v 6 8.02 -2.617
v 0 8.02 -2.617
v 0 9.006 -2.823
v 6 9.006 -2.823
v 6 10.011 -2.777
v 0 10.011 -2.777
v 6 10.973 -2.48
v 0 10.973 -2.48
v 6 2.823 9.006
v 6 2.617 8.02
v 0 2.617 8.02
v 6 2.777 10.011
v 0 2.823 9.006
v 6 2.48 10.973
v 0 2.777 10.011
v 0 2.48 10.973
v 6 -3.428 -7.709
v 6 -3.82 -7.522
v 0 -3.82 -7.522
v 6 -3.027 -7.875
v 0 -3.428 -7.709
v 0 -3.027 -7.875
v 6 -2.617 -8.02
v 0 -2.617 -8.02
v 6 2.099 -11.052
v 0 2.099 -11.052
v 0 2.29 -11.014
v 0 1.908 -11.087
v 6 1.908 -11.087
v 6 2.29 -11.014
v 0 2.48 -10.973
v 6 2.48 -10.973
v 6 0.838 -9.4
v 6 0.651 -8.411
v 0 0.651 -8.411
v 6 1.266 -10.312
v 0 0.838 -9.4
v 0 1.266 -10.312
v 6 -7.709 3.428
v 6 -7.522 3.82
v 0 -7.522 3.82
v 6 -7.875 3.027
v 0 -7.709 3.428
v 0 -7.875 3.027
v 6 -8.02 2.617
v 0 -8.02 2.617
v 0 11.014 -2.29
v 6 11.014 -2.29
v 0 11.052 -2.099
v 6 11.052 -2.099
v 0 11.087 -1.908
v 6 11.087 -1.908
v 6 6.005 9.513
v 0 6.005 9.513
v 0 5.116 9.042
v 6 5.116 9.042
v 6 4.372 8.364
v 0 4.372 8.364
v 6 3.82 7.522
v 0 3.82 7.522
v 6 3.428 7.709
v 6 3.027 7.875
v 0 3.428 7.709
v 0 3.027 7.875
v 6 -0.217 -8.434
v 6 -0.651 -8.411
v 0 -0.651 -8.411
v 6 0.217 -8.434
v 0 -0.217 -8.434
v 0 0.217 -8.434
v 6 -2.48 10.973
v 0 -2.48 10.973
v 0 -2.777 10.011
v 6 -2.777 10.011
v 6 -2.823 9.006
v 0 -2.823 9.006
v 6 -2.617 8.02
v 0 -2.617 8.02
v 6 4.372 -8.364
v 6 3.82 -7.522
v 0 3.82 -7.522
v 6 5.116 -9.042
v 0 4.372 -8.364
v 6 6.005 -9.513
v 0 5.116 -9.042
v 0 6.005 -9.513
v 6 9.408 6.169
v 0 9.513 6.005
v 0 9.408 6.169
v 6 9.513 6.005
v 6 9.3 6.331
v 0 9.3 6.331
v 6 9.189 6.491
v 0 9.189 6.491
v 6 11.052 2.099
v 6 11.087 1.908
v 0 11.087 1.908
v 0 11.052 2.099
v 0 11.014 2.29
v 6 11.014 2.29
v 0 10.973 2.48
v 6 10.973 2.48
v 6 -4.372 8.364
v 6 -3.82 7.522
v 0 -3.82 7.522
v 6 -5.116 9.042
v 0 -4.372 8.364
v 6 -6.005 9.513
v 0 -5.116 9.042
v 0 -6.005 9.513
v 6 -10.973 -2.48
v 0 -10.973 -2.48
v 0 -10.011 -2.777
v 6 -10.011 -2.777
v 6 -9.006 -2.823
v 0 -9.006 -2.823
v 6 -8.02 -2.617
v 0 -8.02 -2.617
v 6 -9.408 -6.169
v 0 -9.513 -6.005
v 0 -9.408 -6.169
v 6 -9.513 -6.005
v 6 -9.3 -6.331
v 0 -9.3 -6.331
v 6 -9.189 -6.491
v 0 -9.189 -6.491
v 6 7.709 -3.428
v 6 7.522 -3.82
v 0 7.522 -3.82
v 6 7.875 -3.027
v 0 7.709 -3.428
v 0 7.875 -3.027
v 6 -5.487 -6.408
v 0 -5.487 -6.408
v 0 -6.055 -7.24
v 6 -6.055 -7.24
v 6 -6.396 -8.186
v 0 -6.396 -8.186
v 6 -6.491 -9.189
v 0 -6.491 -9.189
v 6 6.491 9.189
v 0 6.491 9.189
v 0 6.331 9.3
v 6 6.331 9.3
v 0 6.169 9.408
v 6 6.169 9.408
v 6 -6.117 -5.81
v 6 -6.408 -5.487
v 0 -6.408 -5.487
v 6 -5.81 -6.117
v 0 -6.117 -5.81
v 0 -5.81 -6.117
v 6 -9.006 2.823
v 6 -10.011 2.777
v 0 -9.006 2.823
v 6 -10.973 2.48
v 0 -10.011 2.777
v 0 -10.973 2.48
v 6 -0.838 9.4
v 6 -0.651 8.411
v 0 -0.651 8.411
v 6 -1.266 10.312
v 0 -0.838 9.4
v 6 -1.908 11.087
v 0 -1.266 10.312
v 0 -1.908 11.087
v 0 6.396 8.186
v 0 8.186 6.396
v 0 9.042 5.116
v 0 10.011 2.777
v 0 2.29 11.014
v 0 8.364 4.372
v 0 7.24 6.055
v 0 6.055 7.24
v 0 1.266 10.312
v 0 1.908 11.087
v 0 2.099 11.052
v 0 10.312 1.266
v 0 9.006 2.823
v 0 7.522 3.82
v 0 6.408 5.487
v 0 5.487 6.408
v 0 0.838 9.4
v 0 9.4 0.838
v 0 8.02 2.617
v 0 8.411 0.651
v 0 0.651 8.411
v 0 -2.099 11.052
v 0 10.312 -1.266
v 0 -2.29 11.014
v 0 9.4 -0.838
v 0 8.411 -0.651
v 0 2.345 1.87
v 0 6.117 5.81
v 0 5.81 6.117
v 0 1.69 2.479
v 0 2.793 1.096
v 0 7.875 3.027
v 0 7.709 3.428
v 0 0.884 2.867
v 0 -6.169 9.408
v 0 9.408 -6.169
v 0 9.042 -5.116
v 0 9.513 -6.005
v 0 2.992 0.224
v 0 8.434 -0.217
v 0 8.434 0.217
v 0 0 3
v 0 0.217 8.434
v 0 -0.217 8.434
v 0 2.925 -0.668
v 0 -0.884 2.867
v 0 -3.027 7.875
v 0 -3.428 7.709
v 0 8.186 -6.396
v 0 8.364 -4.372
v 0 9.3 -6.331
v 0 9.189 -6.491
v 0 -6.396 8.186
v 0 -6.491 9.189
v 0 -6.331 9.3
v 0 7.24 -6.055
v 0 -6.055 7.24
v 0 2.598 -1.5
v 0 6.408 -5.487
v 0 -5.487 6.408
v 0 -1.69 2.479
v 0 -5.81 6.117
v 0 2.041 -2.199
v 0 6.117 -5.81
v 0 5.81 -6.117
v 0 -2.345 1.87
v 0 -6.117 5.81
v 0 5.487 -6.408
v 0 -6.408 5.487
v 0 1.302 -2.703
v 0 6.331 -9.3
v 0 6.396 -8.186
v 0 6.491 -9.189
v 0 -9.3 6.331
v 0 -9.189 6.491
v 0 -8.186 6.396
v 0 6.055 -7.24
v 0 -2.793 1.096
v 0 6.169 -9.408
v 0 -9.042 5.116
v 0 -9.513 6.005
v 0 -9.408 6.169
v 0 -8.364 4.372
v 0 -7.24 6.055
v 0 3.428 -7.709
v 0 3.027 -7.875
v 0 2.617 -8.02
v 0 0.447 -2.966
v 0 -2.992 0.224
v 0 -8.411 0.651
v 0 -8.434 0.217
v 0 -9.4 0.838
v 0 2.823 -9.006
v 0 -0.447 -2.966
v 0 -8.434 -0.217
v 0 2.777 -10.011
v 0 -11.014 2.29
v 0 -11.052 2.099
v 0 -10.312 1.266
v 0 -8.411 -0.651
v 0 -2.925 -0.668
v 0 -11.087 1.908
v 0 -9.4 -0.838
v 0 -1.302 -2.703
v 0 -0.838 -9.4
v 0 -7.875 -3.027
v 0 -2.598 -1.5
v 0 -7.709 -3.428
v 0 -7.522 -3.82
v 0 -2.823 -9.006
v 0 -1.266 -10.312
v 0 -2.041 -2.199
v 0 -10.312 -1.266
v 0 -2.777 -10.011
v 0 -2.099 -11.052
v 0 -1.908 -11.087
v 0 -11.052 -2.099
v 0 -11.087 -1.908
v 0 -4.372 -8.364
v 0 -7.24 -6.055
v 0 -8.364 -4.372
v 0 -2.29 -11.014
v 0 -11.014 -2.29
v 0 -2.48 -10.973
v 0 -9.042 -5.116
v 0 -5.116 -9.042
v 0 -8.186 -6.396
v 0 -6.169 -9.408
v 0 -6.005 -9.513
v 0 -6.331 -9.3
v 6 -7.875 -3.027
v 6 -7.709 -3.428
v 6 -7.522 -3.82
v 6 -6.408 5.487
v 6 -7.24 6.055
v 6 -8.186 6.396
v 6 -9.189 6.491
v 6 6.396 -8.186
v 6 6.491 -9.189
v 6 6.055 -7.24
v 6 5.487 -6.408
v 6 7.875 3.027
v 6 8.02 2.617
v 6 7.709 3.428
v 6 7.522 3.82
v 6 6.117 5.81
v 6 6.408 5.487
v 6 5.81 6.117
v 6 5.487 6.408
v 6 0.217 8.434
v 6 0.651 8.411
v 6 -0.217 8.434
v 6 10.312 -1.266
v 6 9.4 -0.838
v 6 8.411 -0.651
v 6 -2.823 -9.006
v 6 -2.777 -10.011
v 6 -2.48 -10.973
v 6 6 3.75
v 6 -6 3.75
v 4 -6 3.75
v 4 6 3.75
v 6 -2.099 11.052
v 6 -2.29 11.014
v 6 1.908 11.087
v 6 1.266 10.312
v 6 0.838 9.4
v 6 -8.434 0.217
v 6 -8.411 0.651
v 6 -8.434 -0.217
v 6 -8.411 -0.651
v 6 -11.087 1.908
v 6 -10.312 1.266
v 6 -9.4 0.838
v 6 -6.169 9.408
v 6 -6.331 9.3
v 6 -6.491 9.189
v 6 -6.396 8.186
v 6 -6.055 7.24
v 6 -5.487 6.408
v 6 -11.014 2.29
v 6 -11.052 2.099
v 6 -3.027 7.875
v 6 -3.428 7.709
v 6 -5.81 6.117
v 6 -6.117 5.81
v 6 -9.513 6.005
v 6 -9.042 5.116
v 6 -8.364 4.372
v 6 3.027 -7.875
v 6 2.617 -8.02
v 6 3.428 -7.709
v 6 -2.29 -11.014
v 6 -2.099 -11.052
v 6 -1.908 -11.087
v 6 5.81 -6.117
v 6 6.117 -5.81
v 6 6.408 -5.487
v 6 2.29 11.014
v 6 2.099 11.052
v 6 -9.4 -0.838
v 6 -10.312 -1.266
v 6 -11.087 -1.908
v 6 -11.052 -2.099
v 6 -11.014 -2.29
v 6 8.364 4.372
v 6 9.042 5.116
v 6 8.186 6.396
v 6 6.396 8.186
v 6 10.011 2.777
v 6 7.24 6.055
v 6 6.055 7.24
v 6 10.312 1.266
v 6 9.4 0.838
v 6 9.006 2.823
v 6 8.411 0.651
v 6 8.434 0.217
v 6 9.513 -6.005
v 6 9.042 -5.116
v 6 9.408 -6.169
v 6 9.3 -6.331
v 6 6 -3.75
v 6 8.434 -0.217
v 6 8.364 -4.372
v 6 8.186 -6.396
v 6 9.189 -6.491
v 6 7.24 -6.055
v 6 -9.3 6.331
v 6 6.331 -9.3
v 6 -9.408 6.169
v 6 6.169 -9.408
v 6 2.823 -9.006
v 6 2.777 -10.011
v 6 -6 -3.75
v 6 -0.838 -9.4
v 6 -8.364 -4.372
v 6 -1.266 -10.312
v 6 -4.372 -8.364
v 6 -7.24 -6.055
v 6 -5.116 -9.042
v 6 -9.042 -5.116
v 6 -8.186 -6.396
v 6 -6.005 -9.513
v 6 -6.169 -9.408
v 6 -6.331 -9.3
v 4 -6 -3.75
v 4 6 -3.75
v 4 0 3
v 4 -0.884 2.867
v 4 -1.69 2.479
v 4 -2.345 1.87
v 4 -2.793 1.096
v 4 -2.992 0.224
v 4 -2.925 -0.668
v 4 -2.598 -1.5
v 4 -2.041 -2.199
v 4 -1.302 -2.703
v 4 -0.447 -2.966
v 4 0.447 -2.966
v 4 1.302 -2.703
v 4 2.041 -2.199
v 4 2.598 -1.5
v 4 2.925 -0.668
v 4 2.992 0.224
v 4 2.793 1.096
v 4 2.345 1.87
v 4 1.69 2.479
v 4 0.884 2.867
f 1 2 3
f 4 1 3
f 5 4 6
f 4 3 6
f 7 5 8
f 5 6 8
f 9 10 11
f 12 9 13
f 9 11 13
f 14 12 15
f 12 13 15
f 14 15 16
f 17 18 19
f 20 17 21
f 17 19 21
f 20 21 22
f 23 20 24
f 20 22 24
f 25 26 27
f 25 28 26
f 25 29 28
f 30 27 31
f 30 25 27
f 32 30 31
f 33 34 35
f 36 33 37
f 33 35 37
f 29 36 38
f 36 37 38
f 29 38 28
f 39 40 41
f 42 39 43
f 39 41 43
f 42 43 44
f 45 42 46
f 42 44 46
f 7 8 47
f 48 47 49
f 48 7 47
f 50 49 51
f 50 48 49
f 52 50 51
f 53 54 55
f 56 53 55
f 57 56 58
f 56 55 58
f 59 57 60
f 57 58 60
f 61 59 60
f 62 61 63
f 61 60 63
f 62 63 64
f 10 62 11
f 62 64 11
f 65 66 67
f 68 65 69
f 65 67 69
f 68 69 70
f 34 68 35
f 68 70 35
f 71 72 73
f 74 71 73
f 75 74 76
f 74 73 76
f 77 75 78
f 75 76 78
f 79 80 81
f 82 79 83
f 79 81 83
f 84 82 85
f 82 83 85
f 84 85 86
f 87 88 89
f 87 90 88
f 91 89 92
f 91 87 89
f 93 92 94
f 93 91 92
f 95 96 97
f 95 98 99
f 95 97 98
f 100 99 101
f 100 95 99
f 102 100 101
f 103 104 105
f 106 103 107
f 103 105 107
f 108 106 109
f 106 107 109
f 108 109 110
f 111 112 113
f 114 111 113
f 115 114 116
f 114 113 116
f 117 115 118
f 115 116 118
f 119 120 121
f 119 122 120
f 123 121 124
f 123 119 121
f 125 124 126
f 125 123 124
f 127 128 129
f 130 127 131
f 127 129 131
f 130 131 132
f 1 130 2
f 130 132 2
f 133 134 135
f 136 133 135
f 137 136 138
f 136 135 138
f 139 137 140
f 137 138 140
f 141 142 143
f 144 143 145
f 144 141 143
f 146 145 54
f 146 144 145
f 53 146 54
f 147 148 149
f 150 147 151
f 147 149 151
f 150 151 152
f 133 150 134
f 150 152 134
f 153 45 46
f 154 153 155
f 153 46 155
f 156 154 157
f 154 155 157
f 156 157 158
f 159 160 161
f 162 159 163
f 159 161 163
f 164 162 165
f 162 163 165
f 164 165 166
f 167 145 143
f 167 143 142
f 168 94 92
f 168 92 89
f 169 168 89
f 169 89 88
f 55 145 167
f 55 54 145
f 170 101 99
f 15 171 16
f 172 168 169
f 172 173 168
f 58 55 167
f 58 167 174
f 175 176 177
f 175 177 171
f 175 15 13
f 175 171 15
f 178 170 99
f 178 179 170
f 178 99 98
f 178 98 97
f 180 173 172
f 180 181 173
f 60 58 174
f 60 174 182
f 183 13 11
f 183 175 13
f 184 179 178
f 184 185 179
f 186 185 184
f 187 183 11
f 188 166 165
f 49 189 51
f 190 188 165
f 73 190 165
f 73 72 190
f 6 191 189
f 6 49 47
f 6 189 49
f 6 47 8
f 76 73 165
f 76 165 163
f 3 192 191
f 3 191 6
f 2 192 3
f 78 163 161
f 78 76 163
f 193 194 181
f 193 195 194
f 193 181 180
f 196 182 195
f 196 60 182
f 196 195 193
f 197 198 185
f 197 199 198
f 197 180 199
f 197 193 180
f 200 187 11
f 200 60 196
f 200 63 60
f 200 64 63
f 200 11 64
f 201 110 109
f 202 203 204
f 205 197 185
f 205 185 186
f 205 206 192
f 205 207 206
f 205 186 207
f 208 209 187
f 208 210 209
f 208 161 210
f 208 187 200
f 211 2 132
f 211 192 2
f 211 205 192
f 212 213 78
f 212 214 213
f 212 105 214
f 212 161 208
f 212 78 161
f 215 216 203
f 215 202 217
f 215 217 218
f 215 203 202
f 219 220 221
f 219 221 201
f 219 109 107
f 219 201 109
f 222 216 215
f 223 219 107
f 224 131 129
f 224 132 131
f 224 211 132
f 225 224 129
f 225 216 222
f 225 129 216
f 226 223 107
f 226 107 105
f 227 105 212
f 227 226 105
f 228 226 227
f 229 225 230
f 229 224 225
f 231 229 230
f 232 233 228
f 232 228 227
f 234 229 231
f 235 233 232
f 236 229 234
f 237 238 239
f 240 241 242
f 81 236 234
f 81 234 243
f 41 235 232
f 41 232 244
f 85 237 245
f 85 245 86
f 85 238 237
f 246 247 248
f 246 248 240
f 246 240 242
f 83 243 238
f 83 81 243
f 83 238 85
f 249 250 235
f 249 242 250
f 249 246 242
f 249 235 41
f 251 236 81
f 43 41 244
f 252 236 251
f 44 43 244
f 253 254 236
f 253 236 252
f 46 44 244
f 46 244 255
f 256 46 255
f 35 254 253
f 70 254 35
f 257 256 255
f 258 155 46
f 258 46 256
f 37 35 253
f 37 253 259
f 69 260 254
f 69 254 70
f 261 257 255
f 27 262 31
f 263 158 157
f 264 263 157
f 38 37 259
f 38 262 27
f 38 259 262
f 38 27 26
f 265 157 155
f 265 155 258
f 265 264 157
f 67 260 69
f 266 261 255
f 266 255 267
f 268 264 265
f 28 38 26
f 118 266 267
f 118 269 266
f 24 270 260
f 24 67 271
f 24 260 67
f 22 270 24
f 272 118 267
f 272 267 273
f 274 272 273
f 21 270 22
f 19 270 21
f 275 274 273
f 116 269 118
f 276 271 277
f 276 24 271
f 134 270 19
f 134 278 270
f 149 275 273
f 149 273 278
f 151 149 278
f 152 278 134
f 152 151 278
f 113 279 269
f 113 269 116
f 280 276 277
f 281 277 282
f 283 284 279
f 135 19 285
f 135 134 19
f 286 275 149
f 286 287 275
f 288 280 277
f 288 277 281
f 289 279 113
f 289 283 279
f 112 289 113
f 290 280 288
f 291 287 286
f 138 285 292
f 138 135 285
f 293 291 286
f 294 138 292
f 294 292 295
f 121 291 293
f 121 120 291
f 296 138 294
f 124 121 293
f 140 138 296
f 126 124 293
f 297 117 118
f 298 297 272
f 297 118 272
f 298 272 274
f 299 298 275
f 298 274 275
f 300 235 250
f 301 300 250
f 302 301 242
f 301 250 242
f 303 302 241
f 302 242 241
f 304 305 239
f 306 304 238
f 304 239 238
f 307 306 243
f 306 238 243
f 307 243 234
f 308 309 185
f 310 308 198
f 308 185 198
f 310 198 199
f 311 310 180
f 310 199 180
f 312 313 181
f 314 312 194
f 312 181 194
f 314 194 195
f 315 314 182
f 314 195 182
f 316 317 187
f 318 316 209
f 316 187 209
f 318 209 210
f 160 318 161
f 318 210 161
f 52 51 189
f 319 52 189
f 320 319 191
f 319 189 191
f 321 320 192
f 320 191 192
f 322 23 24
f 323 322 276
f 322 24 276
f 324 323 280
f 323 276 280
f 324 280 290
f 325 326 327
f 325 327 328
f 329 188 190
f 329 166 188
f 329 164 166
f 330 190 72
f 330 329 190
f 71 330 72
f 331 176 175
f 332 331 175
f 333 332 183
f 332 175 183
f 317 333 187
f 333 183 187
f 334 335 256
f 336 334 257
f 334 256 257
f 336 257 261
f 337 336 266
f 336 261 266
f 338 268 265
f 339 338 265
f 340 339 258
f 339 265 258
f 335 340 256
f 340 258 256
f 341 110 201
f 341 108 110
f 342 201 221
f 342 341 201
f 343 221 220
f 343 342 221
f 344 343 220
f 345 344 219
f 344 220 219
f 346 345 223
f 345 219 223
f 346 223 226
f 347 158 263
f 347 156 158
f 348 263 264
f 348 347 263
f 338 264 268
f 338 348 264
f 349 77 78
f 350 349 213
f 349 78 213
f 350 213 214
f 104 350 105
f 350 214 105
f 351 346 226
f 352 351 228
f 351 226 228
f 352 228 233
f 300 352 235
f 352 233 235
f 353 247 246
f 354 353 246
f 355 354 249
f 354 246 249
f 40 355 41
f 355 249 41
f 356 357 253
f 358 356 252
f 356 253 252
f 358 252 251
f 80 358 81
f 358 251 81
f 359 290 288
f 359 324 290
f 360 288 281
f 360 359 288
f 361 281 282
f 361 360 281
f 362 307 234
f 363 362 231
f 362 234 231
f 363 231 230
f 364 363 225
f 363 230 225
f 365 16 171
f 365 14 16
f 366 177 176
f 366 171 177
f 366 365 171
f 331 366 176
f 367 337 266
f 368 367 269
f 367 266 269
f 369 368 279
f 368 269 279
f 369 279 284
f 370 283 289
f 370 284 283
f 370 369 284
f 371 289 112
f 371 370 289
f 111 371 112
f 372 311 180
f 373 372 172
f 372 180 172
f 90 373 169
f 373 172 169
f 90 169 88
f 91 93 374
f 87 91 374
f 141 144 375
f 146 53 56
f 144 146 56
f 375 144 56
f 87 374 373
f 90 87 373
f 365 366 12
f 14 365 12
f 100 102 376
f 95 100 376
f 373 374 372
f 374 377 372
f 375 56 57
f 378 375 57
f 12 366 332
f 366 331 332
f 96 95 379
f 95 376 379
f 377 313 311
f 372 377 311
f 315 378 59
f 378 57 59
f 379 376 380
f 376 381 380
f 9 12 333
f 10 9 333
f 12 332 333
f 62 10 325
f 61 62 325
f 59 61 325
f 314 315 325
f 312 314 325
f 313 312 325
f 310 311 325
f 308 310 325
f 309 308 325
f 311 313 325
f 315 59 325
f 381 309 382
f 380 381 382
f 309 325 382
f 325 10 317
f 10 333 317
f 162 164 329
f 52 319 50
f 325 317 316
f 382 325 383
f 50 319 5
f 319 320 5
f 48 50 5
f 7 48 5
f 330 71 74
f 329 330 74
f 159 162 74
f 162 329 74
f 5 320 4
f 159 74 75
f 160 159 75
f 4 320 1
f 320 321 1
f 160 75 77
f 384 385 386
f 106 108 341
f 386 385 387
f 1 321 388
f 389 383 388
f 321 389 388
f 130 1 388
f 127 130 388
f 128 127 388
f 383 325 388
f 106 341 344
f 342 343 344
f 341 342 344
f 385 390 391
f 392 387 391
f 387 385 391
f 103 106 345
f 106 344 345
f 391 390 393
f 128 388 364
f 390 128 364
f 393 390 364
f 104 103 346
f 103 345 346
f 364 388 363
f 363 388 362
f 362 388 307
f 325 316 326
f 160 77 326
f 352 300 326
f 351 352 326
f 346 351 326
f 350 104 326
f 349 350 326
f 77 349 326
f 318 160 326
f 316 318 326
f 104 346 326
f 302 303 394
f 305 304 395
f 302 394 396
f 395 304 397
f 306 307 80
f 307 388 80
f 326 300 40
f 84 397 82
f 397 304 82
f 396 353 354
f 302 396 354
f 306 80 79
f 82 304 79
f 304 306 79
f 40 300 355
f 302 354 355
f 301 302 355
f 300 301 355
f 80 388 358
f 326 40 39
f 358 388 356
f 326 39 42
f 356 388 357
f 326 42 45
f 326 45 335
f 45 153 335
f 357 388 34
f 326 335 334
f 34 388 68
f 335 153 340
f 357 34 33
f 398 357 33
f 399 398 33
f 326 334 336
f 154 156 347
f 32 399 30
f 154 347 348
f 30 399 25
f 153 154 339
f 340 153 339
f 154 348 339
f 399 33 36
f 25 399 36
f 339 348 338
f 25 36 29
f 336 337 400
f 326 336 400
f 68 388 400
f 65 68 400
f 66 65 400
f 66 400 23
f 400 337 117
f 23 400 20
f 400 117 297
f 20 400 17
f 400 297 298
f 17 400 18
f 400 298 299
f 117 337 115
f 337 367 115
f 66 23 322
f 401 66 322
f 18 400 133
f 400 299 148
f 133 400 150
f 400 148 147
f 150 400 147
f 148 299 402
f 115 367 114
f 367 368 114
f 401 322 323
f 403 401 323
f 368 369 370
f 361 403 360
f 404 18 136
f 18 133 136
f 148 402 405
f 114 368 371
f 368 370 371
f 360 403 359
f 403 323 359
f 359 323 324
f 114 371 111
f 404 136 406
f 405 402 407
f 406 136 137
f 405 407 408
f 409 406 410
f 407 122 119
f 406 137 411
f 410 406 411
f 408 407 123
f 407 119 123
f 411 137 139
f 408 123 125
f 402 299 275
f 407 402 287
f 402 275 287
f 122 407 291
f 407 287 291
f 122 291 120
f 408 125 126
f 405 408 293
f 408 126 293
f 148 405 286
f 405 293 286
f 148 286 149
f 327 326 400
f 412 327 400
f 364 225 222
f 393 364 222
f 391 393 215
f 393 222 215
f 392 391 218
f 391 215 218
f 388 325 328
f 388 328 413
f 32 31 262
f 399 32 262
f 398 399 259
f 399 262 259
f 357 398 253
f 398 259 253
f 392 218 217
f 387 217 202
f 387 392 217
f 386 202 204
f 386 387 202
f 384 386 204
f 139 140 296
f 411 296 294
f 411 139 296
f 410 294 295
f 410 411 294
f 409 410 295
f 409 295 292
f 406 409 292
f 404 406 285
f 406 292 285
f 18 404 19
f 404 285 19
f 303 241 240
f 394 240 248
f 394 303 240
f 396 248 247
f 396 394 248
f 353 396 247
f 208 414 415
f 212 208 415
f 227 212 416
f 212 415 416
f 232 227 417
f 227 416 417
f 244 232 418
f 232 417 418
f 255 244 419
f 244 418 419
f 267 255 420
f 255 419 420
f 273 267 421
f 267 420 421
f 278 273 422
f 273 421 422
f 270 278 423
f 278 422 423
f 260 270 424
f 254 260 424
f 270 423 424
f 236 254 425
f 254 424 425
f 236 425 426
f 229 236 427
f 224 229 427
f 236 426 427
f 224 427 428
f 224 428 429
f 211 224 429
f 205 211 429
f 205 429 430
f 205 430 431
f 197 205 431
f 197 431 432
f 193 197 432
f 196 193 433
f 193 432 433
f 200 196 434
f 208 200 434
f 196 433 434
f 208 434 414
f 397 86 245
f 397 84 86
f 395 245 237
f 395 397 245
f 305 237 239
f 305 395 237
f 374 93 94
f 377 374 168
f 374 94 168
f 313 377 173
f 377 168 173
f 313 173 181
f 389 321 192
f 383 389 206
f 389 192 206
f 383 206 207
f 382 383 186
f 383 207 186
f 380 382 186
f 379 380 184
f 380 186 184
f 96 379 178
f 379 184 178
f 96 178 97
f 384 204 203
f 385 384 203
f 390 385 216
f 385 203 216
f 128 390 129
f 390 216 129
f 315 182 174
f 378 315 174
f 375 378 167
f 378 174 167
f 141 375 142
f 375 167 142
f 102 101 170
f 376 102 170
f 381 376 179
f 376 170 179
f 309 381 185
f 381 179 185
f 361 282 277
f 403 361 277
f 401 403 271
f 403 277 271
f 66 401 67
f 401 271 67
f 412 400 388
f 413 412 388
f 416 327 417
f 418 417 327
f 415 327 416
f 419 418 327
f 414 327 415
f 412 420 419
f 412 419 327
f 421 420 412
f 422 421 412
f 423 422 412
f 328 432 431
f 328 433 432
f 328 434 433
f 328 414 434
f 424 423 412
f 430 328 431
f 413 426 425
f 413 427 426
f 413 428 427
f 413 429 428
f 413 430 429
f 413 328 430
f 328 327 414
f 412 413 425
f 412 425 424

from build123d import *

# Parameters (mm, degrees)
BASPROSKE_W         = 6
BASPROSKE_H         = 11.25
TOOTHCUT_DEPTH      = 18.003676073
TEETHCUTS_COUNT     = 16
TEETHCUTS_ANGLE     = 337.5
BORSKE_R            = 3
BORE_DEPTH          = 50.0000508
SKETCH_1_W          = 7.5
SKETCH_1_H          = 12
CUT_EXTRUDE_1_DEPTH = 2


with BuildPart() as part:
    # BasProSke → Base-Revolve (revolve)
    with BuildSketch(Plane(origin=(0, 0, 0), x_dir=(1, 0, 0), z_dir=(0, 1, 0)), mode=Mode.PRIVATE) as base_revolve_sk:
        with Locations((3, 5.625)):
            Rectangle(BASPROSKE_W, BASPROSKE_H)
    revolve(base_revolve_sk.sketch.rotate(Axis((-10, 0, 0), (1, 0, 0)), 180), axis=Axis((-10, 0, 0), (1, 0, 0)))

    # TooCutSke → ToothCut (cut, through all)
    with BuildSketch(Plane(origin=(0, 0, 0), x_dir=(0, 0, -1), z_dir=(1, 0, 0))):
        with BuildLine():
            ThreePointArc((0.651061533, 8.411340626), (0, 8.4365), (-0.651061533, 8.411340626))
            ThreePointArc((-0.651061533, 8.411340626), (-1.029874156, 9.883978829), (-1.930926138, 11.108832945))
            ThreePointArc((-1.930926138, 11.108832945), (0, 11.2754), (1.930926138, 11.108832945))
            ThreePointArc((1.930926138, 11.108832945), (1.029874156, 9.883978829), (0.651061533, 8.411340626))
        make_face()
    toothcut = extrude(amount=TOOTHCUT_DEPTH, mode=Mode.SUBTRACT)

    # TeethCuts: ToothCut ×16 about axis
    teethcuts_axis = Axis((-10, 0, 0), (1, 0, 0))
    for i in range(1, TEETHCUTS_COUNT):
        add(toothcut.rotate(teethcuts_axis, i * TEETHCUTS_ANGLE / (TEETHCUTS_COUNT - 1)), mode=Mode.SUBTRACT)

    # BorSke → Bore (cut, symmetric)
    with BuildSketch(Plane(origin=(0, 0, 0), x_dir=(0, 0, -1), z_dir=(1, 0, 0))):
        with Locations(Location((0, 0, 0), (0, 0, 180))):
            Circle(BORSKE_R)
    extrude(amount=BORE_DEPTH, both=True, mode=Mode.SUBTRACT)

    # Эскиз1 → Вырез-Вытянуть1 (cut)
    with BuildSketch(Plane(origin=(6, 0, 0), x_dir=(0, 0, -1), z_dir=(1, 0, 0))):
        Rectangle(SKETCH_1_W, SKETCH_1_H)
    extrude(amount=-CUT_EXTRUDE_1_DEPTH, mode=Mode.SUBTRACT)


solid = part.part
